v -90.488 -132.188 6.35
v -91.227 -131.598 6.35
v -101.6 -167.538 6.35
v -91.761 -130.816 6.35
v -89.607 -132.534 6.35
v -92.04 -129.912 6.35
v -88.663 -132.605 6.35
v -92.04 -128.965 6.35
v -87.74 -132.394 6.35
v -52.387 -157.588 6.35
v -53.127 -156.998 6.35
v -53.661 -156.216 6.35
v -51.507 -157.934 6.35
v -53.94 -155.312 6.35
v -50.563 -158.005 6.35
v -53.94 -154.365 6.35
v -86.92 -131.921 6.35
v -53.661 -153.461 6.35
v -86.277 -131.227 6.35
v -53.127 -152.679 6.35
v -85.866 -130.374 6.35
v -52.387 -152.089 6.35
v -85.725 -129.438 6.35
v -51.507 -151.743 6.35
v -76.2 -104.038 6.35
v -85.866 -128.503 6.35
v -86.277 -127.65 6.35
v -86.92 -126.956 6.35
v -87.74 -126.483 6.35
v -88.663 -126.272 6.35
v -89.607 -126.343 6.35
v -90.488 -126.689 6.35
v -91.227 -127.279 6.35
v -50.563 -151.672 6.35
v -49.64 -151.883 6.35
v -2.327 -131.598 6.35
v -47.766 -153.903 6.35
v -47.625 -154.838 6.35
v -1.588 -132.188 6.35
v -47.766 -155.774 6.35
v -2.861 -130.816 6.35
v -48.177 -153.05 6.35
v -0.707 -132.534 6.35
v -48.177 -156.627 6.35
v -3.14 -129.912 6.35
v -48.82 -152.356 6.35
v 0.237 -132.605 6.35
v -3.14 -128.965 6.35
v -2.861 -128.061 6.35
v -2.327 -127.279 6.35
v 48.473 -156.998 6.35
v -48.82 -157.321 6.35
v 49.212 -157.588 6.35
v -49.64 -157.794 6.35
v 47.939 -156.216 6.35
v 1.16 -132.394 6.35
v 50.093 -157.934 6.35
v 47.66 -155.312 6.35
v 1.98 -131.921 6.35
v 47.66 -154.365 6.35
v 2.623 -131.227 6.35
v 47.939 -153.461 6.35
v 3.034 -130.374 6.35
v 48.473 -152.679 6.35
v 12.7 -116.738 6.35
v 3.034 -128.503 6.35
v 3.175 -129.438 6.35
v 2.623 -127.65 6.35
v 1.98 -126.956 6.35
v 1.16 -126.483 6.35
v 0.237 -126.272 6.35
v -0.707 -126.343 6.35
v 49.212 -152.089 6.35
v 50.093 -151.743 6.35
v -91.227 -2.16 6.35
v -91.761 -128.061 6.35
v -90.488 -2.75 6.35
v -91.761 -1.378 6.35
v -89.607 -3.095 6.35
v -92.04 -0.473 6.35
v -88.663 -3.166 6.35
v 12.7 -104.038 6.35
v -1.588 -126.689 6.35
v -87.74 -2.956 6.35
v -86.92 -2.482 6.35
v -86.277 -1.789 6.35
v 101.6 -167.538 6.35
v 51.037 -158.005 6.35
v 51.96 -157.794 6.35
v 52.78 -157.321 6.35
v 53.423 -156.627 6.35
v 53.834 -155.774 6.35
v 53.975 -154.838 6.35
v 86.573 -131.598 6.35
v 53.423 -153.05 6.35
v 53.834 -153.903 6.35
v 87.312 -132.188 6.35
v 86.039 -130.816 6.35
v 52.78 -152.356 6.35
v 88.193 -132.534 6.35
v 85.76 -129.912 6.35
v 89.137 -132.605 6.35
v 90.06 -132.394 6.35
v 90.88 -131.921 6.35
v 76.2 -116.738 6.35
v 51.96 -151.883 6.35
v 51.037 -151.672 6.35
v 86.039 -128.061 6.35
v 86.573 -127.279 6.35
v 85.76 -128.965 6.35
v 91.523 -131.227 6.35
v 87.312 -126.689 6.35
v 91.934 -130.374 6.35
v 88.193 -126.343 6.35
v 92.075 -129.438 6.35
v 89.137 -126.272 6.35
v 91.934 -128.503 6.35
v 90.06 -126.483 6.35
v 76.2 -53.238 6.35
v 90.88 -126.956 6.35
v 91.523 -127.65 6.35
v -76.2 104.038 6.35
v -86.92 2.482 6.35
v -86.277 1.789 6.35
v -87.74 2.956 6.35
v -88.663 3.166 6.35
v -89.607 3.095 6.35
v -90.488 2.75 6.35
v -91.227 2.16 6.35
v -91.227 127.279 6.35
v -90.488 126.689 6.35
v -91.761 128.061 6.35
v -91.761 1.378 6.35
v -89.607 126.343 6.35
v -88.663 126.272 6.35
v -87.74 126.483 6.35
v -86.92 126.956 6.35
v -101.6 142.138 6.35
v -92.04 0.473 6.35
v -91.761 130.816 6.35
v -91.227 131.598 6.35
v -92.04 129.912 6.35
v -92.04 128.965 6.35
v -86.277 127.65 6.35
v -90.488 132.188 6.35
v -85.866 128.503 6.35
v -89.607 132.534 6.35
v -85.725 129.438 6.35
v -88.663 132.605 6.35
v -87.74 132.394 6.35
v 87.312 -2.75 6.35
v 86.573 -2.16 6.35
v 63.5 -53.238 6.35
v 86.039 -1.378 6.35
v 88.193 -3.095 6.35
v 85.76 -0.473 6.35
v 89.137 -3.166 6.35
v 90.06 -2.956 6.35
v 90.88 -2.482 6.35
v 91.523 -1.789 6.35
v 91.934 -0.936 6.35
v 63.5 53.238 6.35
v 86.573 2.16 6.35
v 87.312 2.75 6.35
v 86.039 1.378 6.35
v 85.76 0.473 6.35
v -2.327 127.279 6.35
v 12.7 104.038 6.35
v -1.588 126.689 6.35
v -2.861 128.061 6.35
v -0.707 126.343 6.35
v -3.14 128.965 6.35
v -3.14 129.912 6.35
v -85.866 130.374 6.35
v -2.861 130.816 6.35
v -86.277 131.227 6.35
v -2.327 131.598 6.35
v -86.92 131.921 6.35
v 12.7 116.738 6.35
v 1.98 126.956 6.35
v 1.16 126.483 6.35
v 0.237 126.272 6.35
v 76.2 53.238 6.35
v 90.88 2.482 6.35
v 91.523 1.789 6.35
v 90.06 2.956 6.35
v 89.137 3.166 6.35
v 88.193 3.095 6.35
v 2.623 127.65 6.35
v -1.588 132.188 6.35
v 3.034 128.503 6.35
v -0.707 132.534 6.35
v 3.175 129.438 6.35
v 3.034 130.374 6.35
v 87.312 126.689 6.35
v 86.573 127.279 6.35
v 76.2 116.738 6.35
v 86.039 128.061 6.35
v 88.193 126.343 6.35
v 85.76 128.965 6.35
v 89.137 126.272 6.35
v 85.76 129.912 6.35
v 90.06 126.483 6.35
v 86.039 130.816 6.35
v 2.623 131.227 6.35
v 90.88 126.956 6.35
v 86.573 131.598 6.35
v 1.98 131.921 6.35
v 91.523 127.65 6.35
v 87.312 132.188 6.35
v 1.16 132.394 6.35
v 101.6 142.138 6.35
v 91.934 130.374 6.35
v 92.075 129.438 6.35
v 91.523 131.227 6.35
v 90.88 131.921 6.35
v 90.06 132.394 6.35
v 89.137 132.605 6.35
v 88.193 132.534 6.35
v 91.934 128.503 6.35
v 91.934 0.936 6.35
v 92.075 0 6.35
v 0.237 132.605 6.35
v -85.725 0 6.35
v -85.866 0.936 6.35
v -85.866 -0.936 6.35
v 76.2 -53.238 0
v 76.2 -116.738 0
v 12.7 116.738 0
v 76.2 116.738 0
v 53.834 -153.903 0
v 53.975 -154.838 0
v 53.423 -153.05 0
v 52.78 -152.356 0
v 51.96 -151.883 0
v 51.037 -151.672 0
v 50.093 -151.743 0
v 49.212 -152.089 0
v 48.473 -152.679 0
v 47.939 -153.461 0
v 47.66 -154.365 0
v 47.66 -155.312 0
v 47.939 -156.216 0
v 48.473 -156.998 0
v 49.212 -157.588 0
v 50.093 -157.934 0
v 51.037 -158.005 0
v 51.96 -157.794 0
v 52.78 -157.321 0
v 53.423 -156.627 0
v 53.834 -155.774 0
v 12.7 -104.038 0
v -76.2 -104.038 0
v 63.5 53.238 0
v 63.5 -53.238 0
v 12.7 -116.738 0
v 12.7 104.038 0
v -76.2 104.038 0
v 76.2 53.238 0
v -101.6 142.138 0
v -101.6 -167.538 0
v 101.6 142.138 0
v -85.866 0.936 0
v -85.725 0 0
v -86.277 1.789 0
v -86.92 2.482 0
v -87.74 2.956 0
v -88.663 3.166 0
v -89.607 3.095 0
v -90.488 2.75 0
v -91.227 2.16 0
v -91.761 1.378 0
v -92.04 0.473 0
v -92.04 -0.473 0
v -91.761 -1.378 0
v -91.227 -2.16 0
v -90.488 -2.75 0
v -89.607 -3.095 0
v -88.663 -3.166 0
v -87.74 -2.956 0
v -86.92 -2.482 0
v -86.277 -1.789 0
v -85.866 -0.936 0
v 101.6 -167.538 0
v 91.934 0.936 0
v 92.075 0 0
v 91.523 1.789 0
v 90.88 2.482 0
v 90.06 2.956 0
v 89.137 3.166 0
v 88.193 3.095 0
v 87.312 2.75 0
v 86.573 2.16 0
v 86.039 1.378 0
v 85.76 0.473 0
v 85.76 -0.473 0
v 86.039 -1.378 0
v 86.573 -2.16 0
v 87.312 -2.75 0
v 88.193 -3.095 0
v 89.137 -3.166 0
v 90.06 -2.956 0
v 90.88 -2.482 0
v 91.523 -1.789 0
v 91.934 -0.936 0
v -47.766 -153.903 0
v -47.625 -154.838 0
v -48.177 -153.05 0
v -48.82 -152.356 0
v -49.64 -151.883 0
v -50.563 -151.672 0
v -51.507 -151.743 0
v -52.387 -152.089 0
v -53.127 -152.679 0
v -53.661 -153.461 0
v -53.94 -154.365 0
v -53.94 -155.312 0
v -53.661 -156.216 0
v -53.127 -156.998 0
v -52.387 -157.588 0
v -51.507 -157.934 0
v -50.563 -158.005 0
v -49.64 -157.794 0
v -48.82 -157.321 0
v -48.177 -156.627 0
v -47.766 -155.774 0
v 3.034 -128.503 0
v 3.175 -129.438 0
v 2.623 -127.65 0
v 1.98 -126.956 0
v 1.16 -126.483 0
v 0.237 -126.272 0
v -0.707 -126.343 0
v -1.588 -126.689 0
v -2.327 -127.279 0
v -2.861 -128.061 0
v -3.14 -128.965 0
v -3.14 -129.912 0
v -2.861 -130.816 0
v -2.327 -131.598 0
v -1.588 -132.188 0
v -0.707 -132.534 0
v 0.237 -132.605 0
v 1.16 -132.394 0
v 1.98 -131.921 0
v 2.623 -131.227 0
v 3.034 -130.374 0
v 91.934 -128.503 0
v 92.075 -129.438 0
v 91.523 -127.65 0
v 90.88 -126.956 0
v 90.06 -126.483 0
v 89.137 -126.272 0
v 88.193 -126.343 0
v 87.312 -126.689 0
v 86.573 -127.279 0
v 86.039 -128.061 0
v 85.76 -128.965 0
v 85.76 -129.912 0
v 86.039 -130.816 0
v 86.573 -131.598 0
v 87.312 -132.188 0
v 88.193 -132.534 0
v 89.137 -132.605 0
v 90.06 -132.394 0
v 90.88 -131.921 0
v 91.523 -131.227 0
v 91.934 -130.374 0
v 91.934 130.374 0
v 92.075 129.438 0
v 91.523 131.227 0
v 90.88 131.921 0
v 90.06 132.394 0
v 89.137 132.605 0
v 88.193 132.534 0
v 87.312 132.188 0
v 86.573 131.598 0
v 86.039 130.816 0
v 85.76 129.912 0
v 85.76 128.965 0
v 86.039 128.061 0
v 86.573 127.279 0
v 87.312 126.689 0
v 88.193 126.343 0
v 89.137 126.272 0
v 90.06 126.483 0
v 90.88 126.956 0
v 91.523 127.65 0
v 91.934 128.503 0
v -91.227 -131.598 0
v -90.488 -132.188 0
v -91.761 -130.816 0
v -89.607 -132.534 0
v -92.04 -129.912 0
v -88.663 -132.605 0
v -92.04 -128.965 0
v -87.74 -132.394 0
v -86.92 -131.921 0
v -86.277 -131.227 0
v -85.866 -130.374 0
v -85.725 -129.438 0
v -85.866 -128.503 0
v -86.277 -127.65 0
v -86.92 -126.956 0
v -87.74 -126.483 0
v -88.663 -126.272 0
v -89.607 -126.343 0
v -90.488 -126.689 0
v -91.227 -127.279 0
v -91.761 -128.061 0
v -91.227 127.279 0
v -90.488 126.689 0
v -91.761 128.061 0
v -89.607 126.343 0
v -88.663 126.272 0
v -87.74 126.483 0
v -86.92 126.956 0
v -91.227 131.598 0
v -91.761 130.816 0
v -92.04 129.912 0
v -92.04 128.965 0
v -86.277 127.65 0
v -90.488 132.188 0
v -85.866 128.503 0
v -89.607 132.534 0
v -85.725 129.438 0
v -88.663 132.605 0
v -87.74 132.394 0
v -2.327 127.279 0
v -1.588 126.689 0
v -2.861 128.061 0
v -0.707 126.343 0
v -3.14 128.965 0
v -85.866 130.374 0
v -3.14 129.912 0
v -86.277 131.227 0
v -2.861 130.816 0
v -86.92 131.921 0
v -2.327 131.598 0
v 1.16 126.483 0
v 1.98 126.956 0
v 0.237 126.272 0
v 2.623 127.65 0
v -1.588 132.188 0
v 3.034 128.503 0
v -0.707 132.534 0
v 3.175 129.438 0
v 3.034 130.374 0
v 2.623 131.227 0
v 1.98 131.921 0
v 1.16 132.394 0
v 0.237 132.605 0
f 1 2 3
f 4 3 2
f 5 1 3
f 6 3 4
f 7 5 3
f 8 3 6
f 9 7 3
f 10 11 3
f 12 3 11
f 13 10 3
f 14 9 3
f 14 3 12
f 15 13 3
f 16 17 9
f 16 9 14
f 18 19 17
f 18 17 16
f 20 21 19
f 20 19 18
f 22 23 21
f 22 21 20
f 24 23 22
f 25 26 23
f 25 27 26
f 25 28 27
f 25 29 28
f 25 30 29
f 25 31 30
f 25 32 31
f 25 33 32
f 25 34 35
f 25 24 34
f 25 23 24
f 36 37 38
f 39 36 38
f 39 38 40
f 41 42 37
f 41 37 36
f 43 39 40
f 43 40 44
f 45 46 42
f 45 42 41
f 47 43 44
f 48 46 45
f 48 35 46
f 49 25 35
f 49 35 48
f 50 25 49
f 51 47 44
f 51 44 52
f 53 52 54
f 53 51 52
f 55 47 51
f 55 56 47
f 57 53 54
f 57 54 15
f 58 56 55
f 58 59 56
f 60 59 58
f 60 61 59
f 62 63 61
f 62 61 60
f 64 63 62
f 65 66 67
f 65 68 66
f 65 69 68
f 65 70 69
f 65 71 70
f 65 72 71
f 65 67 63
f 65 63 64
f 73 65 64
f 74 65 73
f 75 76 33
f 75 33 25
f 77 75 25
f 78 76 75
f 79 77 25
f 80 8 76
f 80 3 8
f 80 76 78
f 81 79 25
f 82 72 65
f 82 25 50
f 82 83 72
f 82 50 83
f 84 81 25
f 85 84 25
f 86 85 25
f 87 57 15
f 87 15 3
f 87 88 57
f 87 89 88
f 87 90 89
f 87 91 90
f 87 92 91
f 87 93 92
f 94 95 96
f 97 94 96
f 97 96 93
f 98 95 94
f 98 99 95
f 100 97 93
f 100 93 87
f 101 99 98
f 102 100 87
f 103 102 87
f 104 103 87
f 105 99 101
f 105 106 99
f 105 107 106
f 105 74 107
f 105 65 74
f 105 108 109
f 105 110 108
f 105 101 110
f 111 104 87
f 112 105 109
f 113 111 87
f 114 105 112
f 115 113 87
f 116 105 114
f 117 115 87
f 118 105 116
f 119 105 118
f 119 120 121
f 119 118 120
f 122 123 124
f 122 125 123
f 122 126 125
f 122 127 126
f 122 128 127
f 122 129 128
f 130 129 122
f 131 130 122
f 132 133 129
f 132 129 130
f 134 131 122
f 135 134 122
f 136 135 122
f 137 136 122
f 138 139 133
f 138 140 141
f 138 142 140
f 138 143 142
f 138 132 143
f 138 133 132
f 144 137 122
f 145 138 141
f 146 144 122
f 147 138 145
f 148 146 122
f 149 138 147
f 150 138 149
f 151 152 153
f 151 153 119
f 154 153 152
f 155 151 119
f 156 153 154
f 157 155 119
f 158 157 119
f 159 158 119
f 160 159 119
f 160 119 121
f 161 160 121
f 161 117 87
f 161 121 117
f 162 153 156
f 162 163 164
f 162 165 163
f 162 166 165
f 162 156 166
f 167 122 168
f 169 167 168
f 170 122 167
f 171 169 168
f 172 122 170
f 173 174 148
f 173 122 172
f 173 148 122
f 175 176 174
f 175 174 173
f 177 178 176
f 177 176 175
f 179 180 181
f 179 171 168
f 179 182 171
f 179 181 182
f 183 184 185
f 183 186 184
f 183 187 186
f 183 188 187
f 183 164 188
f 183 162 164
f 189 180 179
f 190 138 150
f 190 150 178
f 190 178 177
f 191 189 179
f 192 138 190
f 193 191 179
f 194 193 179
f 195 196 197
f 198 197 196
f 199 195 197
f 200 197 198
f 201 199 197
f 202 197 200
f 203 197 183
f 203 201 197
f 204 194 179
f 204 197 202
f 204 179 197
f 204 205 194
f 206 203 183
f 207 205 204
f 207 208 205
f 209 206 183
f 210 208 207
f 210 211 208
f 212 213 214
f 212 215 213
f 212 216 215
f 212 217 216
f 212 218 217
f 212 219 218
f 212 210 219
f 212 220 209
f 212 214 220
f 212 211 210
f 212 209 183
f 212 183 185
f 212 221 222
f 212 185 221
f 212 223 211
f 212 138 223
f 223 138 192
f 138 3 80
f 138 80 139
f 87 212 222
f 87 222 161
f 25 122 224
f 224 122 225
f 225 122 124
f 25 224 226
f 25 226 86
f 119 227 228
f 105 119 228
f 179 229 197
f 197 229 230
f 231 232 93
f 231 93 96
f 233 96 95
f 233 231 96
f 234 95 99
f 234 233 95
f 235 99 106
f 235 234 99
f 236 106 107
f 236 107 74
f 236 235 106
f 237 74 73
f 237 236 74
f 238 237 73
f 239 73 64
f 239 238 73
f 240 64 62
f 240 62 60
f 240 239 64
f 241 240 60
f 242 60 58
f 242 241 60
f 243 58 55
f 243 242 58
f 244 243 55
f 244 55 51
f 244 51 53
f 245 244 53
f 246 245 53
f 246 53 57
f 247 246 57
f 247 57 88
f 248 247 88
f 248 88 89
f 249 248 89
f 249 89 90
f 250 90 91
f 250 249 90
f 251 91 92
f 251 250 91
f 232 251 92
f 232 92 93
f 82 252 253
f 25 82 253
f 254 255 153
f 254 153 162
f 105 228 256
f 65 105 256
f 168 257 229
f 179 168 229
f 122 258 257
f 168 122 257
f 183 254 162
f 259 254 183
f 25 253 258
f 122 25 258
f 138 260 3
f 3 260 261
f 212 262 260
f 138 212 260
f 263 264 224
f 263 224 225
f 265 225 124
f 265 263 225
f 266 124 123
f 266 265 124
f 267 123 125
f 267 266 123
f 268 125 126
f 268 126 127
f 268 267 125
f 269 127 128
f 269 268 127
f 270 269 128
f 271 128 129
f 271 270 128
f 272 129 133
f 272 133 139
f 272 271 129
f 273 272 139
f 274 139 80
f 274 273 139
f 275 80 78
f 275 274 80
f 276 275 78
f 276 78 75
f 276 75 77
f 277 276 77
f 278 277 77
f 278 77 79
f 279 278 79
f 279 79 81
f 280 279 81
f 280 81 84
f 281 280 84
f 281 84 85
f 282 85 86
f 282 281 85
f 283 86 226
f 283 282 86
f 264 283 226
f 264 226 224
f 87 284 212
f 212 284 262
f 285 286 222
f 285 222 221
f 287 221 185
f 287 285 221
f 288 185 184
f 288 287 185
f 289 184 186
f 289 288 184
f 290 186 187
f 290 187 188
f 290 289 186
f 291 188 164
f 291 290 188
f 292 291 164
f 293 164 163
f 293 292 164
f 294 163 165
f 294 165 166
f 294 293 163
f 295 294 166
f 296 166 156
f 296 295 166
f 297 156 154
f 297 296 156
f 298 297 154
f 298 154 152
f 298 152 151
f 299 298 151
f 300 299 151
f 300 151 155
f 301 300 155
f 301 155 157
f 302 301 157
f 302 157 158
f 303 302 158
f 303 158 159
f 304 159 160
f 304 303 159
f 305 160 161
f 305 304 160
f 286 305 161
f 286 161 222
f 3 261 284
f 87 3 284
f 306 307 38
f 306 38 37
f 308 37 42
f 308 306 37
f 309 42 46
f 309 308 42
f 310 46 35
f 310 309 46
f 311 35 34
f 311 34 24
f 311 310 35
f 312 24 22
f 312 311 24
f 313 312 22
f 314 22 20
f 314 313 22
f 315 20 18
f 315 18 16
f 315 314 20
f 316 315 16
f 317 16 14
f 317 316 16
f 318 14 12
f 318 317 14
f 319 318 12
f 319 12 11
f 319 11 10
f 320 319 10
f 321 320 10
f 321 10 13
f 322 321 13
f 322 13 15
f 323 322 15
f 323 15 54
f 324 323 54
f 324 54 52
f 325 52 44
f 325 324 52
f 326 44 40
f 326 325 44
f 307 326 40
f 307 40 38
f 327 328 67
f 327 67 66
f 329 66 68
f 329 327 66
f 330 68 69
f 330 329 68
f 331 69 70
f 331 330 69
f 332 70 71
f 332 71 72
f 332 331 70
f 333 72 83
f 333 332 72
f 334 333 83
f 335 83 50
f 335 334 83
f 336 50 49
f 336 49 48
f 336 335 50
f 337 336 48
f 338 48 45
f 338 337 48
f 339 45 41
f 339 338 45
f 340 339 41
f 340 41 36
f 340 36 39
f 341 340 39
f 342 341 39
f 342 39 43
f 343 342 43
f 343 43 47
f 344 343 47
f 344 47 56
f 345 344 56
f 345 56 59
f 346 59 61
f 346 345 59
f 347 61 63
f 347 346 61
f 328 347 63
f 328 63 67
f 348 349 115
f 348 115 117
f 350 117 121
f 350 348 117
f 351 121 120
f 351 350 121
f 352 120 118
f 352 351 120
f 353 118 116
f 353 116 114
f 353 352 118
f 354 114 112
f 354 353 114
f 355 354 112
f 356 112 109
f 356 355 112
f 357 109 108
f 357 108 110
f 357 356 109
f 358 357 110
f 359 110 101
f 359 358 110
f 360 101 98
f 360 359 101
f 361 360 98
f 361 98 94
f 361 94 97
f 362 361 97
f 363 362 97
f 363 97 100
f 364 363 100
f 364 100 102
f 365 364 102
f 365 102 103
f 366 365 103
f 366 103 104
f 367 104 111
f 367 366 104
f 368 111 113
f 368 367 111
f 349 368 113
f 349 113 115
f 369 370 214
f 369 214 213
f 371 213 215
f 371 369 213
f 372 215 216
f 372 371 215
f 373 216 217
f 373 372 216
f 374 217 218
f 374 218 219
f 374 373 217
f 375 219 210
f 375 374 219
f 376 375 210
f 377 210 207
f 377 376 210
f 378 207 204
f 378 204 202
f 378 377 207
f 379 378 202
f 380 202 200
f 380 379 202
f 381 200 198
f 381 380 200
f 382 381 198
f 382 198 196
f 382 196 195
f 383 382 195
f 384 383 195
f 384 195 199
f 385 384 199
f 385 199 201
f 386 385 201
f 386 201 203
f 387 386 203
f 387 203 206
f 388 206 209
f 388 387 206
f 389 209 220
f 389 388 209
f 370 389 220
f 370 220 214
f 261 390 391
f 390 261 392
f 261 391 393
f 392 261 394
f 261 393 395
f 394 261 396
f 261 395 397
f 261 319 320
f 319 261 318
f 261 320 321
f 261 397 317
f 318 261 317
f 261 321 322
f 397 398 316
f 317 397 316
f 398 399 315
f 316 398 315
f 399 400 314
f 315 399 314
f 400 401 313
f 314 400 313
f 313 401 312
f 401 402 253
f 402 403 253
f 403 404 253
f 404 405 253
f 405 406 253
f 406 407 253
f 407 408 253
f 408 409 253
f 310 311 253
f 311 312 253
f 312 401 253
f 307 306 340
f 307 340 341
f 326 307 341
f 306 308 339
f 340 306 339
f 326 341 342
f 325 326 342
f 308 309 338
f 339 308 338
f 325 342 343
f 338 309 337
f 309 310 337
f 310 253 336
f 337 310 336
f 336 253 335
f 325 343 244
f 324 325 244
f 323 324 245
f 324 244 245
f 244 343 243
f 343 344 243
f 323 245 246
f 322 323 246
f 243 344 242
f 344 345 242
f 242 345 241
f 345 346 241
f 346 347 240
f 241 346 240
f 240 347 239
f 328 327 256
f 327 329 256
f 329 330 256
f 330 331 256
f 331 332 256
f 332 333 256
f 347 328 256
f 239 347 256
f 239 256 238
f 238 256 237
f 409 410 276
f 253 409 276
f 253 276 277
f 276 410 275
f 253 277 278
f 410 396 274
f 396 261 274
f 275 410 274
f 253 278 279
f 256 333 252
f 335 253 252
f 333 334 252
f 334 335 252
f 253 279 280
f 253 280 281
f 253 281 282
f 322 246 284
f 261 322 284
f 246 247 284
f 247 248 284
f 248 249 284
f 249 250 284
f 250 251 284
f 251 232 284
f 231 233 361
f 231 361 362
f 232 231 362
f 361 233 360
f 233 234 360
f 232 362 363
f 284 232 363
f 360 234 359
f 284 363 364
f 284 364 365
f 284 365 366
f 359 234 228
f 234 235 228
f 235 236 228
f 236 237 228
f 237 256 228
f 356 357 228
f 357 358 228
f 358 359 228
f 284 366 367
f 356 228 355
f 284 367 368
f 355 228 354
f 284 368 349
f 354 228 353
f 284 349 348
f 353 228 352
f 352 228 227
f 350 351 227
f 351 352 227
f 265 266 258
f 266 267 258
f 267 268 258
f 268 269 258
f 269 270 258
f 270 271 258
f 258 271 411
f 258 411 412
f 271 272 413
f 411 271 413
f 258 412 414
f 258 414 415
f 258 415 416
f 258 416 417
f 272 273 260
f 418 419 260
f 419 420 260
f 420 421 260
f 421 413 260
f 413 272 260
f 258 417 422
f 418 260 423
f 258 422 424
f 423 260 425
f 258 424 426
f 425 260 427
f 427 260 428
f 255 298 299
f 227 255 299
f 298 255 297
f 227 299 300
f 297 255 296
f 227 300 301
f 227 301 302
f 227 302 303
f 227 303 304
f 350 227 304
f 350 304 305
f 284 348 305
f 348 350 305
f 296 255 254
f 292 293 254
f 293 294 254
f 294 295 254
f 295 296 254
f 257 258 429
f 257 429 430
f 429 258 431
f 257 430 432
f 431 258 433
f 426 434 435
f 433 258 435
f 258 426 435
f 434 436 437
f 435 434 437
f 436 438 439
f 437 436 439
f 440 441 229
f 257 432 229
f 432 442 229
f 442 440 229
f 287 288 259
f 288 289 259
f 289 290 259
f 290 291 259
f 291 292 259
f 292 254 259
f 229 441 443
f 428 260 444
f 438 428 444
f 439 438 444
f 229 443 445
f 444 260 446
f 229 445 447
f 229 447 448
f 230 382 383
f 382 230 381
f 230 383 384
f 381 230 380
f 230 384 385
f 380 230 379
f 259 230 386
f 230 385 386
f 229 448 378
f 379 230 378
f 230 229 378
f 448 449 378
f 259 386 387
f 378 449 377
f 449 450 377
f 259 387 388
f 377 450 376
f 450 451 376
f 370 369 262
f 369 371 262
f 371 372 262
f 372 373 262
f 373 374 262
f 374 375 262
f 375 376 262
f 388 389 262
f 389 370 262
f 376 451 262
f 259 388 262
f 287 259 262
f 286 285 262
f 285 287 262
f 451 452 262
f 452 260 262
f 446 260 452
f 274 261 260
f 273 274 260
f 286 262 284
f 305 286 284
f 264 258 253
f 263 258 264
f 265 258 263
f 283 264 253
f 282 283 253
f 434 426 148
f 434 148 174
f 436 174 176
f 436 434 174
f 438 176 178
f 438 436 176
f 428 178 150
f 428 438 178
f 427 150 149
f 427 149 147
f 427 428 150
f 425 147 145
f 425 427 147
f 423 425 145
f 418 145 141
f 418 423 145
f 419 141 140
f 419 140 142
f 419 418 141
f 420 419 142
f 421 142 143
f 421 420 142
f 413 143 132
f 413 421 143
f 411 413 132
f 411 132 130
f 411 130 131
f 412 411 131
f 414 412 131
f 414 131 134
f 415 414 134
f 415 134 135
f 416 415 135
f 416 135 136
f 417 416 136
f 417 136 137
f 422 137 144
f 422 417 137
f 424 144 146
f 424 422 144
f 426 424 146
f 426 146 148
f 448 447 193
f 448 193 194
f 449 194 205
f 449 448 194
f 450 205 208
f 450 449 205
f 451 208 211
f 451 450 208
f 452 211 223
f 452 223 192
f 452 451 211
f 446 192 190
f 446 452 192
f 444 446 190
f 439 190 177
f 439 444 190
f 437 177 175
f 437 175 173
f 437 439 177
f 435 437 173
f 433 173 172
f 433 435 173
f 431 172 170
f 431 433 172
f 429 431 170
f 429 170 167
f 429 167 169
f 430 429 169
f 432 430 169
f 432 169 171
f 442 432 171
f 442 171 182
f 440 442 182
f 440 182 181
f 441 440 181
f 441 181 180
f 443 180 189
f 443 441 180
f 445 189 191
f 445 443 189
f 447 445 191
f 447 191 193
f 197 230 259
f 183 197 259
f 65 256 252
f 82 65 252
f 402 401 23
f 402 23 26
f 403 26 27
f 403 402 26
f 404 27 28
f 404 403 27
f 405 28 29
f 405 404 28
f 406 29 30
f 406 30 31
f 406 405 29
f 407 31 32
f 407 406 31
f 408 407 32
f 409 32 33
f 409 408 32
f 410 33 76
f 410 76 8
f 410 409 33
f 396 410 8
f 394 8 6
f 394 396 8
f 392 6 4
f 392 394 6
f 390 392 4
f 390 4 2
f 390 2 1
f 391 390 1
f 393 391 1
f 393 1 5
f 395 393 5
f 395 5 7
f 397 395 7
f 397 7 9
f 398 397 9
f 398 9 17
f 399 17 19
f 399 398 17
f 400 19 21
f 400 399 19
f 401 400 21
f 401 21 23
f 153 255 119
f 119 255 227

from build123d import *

# Parameters (mm, degrees)
F0_R     = 3.175
F0_W     = 12.7
F0_H     = 106.4768
F0_W_2   = 203.2
F0_H_2   = 25.4
F1_DEPTH = 6.35


with BuildPart() as f1:
    # F0 (on Top) → F1 (new body)
    with BuildSketch(Plane.XY):
        Polygon((76.2, 116.7384), (101.6, 116.7384), (101.6, 142.1384), (-101.6, 142.1384), (-101.6, 116.7384), (12.7, 116.7384), (50.8, 116.7384), align=None)
        with Locations((-88.9, 129.4384)):
            Circle(F0_R, mode=Mode.SUBTRACT)
        with Locations((0, 129.4384)):
            Circle(F0_R, mode=Mode.SUBTRACT)
        with Locations((88.9, 129.4384)):
            Circle(F0_R, mode=Mode.SUBTRACT)
        Polygon((101.6, -116.7384), (76.2, -116.7384), (50.8, -116.7384), (12.7, -116.7384), (-101.6, -116.7384), (-101.6, -142.1384), (101.6, -142.1384), align=None)
        with Locations((-88.9, -129.4384)):
            Circle(F0_R, mode=Mode.SUBTRACT)
        with Locations((0, -129.4384)):
            Circle(F0_R, mode=Mode.SUBTRACT)
        with Locations((88.9, -129.4384)):
            Circle(F0_R, mode=Mode.SUBTRACT)
        Polygon((-76.2, -104.0384), (-76.2, -91.3384), (-76.2, 91.3384), (-76.2, 104.0384), (12.7, 104.0384), (12.7, 116.7384), (-101.6, 116.7384), (-101.6, -116.7384), (12.7, -116.7384), (12.7, -104.0384), align=None)
        with Locations((-88.9, 0)):
            Circle(F0_R, mode=Mode.SUBTRACT)
        Polygon((76.2, -53.2384), (76.2, -91.3384), (76.2, -104.0384), (88.9, -104.0384), (88.9, -53.2384), align=None)
        with Locations((69.85, 0)):
            Rectangle(F0_W, F0_H)
        Polygon((76.2, 91.3384), (76.2, 53.2384), (88.9, 53.2384), (88.9, 104.0384), (76.2, 104.0384), align=None)
        Polygon((76.2, 53.2384), (76.2, -53.2384), (88.9, -53.2384), (88.9, -104.0384), (76.2, -104.0384), (76.2, -116.7384), (101.6, -116.7384), (101.6, 116.7384), (76.2, 116.7384), (76.2, 104.0384), (88.9, 104.0384), (88.9, 53.2384), align=None)
        with Locations((88.9, 0)):
            Circle(F0_R, mode=Mode.SUBTRACT)
        with Locations((0, -154.8384)):
            Rectangle(F0_W_2, F0_H_2)
        with Locations((-50.8, -154.8384)):
            Circle(F0_R, mode=Mode.SUBTRACT)
        with Locations((50.8, -154.8384)):
            Circle(F0_R, mode=Mode.SUBTRACT)
    extrude(amount=F1_DEPTH)


solid = f1.part
